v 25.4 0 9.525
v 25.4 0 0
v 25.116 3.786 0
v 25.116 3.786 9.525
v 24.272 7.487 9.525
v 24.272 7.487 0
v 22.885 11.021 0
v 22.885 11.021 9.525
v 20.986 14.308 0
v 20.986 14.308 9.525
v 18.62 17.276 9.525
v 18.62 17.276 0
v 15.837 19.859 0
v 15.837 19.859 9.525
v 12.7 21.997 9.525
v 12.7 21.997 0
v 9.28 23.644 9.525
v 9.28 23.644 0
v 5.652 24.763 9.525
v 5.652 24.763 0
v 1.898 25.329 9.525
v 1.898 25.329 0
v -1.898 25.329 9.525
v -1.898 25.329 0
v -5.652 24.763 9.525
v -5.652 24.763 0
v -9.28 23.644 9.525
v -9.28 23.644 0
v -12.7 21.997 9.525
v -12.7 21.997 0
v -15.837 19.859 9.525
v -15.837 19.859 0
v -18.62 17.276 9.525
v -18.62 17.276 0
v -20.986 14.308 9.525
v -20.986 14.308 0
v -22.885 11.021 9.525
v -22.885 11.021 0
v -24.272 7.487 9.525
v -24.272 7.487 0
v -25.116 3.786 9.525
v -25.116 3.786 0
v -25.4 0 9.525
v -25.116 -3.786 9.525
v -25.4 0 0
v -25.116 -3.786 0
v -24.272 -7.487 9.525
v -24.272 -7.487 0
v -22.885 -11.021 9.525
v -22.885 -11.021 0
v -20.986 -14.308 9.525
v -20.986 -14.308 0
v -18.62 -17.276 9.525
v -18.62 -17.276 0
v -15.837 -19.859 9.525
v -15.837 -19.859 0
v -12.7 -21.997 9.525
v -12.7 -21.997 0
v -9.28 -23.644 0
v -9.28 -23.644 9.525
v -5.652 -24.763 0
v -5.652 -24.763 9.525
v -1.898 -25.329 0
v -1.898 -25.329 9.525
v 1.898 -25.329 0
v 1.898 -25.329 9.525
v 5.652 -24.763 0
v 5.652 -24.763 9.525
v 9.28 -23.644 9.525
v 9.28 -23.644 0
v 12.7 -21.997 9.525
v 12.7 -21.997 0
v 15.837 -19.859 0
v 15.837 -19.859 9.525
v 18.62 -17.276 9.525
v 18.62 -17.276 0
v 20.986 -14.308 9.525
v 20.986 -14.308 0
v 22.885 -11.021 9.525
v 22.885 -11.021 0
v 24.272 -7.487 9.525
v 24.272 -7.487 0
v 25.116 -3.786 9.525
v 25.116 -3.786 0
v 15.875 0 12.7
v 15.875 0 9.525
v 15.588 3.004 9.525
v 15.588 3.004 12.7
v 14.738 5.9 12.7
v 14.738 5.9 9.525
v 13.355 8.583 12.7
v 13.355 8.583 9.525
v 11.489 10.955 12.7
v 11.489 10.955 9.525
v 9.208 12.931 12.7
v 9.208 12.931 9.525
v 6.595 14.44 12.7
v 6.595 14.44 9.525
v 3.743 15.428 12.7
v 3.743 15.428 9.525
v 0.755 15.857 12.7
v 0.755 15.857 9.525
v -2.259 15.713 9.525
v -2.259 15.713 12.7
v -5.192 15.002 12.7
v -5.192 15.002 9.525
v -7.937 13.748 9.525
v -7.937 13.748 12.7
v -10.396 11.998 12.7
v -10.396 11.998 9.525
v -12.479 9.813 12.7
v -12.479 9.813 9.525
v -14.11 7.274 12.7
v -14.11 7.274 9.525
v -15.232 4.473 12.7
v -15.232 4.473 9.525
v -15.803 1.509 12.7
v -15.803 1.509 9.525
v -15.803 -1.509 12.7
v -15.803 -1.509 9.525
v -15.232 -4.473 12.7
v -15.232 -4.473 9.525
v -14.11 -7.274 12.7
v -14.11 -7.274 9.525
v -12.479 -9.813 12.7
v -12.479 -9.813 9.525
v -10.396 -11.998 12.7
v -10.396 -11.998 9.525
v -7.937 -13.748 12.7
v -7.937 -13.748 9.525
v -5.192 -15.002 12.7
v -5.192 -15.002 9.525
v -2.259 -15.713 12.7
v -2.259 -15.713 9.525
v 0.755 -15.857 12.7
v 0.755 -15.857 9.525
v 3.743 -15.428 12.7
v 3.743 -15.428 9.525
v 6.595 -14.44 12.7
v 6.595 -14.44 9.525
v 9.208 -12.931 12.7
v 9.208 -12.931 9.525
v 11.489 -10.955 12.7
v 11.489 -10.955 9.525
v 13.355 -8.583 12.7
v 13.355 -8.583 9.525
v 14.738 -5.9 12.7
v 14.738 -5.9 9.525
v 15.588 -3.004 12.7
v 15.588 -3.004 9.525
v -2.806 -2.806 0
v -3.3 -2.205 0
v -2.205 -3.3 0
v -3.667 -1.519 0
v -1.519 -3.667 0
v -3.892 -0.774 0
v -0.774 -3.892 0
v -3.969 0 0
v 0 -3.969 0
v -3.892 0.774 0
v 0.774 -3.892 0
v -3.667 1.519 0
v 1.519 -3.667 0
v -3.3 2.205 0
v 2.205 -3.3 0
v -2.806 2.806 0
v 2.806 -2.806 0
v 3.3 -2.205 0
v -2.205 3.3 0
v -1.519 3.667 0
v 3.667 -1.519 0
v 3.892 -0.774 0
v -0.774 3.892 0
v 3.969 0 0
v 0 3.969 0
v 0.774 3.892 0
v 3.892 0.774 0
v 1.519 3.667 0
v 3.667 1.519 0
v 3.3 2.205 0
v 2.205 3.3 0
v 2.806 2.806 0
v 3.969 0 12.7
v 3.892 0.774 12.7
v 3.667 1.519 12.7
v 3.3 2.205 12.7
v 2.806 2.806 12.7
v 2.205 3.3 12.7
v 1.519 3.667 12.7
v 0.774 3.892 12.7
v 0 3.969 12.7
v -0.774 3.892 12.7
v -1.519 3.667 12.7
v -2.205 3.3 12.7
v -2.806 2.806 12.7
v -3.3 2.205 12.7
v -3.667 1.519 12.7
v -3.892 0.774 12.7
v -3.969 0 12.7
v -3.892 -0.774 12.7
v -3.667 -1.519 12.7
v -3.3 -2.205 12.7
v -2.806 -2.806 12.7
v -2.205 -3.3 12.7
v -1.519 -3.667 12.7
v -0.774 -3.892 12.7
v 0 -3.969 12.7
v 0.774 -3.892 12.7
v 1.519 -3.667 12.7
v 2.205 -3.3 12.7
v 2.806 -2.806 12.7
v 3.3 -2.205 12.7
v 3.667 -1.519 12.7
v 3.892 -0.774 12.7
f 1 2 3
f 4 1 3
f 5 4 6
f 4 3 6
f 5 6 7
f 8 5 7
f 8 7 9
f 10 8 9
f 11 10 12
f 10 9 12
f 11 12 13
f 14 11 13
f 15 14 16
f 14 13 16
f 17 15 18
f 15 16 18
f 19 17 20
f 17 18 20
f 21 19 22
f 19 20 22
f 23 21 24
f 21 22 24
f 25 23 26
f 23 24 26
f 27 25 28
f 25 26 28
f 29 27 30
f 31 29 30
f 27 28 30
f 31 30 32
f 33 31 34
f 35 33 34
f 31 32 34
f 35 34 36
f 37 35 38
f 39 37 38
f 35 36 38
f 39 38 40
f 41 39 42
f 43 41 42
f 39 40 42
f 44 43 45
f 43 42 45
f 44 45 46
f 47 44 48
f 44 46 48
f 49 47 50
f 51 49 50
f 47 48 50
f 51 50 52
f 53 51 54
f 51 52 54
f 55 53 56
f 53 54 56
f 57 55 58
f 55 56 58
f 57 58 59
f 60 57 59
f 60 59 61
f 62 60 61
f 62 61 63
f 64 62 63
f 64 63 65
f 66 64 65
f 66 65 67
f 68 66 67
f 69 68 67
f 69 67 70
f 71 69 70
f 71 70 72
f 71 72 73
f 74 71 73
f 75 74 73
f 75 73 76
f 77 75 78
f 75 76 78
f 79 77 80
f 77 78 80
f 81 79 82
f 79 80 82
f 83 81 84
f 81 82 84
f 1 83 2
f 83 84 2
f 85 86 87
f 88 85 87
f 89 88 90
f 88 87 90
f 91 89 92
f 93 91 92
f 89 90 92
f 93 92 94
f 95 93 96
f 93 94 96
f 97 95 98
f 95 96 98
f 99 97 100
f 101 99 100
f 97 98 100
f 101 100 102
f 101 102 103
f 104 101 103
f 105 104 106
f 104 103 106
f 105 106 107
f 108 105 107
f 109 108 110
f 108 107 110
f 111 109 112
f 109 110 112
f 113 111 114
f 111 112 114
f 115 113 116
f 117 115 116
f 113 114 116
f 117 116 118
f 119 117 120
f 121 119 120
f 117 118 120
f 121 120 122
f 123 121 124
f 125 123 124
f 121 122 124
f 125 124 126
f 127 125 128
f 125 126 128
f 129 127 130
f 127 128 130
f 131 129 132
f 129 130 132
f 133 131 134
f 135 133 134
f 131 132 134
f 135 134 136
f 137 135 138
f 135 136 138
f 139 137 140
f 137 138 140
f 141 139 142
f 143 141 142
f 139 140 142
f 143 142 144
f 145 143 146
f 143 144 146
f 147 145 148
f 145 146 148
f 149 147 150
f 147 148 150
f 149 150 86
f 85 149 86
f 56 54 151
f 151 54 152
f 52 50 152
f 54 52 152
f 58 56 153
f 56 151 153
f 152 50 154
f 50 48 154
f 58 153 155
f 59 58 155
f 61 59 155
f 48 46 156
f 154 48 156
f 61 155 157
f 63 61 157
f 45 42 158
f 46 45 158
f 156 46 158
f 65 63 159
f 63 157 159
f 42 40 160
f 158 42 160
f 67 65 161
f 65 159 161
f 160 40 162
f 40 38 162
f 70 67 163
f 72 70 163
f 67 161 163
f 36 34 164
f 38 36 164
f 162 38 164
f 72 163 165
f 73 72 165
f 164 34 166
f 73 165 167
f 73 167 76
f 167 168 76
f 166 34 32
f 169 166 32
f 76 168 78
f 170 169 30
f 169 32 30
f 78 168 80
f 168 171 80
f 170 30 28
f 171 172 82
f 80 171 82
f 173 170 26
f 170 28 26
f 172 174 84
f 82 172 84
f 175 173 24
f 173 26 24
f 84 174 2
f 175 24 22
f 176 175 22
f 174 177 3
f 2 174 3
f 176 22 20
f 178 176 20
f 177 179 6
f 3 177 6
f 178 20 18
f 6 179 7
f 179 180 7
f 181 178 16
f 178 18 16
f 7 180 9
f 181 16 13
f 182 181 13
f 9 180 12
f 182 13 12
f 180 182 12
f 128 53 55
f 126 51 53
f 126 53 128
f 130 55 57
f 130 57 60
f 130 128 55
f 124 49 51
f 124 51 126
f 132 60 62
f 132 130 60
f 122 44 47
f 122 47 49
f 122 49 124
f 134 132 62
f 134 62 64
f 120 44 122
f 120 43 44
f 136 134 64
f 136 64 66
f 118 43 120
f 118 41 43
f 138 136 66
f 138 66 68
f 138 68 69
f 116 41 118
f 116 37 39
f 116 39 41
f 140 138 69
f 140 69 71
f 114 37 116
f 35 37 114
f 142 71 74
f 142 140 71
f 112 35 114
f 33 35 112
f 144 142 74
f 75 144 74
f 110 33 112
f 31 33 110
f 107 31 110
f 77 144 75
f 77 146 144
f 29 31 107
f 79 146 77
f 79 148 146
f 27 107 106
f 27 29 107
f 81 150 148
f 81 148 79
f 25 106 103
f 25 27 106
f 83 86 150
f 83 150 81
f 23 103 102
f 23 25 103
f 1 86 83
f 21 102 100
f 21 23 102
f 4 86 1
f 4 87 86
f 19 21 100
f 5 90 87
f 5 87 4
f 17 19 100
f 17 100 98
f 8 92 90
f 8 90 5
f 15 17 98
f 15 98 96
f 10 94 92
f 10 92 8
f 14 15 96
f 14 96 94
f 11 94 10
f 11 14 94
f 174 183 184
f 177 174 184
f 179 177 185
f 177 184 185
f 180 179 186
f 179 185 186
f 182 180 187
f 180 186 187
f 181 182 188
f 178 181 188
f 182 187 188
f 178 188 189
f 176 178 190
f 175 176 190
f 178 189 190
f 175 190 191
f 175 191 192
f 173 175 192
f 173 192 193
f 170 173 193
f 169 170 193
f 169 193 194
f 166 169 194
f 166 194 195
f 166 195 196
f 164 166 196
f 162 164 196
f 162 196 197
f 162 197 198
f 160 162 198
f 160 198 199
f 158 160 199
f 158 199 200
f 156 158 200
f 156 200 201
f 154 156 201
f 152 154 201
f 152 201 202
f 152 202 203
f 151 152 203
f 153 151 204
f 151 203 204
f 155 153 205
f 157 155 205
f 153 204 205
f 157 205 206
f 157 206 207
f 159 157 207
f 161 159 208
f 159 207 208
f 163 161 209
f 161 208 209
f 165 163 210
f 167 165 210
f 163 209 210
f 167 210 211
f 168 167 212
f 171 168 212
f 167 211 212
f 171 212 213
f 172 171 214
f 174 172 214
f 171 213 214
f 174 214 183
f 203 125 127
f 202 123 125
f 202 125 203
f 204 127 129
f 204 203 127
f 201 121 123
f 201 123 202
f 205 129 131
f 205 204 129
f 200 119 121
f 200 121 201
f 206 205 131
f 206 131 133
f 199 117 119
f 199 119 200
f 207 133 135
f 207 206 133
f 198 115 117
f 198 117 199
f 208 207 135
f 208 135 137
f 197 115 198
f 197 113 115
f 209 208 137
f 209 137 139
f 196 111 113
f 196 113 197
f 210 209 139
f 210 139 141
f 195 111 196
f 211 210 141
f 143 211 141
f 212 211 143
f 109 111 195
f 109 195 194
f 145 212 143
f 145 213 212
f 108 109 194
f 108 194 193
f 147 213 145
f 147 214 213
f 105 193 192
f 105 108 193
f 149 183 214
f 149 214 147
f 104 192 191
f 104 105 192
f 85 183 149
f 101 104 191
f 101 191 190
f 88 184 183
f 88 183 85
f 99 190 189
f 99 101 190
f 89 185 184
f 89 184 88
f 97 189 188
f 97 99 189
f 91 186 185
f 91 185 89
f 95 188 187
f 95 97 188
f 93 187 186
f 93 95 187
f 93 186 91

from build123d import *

# Parameters (mm, degrees)
F0_R     = 25.4
F1_DEPTH = 9.525
F2_R     = 15.875
F3_DEPTH = 3.175
F4_R     = 3.96875
F5_DEPTH = 12.701


with BuildPart() as f1:
    # F0 (on Top) → F1 (new body)
    with BuildSketch(Plane.XY):
        Circle(F0_R)
    extrude(amount=F1_DEPTH)

    # F2 (on face) → F3 (join)
    with BuildSketch(Plane.XY.offset(9.525)):
        Circle(F2_R)
    extrude(amount=F3_DEPTH)

    # F4 (on face) → F5 (cut, through all)
    with BuildSketch(Plane.XY.offset(12.7)):
        Circle(F4_R)
    extrude(amount=-F5_DEPTH, mode=Mode.SUBTRACT)


solid = f1.part
